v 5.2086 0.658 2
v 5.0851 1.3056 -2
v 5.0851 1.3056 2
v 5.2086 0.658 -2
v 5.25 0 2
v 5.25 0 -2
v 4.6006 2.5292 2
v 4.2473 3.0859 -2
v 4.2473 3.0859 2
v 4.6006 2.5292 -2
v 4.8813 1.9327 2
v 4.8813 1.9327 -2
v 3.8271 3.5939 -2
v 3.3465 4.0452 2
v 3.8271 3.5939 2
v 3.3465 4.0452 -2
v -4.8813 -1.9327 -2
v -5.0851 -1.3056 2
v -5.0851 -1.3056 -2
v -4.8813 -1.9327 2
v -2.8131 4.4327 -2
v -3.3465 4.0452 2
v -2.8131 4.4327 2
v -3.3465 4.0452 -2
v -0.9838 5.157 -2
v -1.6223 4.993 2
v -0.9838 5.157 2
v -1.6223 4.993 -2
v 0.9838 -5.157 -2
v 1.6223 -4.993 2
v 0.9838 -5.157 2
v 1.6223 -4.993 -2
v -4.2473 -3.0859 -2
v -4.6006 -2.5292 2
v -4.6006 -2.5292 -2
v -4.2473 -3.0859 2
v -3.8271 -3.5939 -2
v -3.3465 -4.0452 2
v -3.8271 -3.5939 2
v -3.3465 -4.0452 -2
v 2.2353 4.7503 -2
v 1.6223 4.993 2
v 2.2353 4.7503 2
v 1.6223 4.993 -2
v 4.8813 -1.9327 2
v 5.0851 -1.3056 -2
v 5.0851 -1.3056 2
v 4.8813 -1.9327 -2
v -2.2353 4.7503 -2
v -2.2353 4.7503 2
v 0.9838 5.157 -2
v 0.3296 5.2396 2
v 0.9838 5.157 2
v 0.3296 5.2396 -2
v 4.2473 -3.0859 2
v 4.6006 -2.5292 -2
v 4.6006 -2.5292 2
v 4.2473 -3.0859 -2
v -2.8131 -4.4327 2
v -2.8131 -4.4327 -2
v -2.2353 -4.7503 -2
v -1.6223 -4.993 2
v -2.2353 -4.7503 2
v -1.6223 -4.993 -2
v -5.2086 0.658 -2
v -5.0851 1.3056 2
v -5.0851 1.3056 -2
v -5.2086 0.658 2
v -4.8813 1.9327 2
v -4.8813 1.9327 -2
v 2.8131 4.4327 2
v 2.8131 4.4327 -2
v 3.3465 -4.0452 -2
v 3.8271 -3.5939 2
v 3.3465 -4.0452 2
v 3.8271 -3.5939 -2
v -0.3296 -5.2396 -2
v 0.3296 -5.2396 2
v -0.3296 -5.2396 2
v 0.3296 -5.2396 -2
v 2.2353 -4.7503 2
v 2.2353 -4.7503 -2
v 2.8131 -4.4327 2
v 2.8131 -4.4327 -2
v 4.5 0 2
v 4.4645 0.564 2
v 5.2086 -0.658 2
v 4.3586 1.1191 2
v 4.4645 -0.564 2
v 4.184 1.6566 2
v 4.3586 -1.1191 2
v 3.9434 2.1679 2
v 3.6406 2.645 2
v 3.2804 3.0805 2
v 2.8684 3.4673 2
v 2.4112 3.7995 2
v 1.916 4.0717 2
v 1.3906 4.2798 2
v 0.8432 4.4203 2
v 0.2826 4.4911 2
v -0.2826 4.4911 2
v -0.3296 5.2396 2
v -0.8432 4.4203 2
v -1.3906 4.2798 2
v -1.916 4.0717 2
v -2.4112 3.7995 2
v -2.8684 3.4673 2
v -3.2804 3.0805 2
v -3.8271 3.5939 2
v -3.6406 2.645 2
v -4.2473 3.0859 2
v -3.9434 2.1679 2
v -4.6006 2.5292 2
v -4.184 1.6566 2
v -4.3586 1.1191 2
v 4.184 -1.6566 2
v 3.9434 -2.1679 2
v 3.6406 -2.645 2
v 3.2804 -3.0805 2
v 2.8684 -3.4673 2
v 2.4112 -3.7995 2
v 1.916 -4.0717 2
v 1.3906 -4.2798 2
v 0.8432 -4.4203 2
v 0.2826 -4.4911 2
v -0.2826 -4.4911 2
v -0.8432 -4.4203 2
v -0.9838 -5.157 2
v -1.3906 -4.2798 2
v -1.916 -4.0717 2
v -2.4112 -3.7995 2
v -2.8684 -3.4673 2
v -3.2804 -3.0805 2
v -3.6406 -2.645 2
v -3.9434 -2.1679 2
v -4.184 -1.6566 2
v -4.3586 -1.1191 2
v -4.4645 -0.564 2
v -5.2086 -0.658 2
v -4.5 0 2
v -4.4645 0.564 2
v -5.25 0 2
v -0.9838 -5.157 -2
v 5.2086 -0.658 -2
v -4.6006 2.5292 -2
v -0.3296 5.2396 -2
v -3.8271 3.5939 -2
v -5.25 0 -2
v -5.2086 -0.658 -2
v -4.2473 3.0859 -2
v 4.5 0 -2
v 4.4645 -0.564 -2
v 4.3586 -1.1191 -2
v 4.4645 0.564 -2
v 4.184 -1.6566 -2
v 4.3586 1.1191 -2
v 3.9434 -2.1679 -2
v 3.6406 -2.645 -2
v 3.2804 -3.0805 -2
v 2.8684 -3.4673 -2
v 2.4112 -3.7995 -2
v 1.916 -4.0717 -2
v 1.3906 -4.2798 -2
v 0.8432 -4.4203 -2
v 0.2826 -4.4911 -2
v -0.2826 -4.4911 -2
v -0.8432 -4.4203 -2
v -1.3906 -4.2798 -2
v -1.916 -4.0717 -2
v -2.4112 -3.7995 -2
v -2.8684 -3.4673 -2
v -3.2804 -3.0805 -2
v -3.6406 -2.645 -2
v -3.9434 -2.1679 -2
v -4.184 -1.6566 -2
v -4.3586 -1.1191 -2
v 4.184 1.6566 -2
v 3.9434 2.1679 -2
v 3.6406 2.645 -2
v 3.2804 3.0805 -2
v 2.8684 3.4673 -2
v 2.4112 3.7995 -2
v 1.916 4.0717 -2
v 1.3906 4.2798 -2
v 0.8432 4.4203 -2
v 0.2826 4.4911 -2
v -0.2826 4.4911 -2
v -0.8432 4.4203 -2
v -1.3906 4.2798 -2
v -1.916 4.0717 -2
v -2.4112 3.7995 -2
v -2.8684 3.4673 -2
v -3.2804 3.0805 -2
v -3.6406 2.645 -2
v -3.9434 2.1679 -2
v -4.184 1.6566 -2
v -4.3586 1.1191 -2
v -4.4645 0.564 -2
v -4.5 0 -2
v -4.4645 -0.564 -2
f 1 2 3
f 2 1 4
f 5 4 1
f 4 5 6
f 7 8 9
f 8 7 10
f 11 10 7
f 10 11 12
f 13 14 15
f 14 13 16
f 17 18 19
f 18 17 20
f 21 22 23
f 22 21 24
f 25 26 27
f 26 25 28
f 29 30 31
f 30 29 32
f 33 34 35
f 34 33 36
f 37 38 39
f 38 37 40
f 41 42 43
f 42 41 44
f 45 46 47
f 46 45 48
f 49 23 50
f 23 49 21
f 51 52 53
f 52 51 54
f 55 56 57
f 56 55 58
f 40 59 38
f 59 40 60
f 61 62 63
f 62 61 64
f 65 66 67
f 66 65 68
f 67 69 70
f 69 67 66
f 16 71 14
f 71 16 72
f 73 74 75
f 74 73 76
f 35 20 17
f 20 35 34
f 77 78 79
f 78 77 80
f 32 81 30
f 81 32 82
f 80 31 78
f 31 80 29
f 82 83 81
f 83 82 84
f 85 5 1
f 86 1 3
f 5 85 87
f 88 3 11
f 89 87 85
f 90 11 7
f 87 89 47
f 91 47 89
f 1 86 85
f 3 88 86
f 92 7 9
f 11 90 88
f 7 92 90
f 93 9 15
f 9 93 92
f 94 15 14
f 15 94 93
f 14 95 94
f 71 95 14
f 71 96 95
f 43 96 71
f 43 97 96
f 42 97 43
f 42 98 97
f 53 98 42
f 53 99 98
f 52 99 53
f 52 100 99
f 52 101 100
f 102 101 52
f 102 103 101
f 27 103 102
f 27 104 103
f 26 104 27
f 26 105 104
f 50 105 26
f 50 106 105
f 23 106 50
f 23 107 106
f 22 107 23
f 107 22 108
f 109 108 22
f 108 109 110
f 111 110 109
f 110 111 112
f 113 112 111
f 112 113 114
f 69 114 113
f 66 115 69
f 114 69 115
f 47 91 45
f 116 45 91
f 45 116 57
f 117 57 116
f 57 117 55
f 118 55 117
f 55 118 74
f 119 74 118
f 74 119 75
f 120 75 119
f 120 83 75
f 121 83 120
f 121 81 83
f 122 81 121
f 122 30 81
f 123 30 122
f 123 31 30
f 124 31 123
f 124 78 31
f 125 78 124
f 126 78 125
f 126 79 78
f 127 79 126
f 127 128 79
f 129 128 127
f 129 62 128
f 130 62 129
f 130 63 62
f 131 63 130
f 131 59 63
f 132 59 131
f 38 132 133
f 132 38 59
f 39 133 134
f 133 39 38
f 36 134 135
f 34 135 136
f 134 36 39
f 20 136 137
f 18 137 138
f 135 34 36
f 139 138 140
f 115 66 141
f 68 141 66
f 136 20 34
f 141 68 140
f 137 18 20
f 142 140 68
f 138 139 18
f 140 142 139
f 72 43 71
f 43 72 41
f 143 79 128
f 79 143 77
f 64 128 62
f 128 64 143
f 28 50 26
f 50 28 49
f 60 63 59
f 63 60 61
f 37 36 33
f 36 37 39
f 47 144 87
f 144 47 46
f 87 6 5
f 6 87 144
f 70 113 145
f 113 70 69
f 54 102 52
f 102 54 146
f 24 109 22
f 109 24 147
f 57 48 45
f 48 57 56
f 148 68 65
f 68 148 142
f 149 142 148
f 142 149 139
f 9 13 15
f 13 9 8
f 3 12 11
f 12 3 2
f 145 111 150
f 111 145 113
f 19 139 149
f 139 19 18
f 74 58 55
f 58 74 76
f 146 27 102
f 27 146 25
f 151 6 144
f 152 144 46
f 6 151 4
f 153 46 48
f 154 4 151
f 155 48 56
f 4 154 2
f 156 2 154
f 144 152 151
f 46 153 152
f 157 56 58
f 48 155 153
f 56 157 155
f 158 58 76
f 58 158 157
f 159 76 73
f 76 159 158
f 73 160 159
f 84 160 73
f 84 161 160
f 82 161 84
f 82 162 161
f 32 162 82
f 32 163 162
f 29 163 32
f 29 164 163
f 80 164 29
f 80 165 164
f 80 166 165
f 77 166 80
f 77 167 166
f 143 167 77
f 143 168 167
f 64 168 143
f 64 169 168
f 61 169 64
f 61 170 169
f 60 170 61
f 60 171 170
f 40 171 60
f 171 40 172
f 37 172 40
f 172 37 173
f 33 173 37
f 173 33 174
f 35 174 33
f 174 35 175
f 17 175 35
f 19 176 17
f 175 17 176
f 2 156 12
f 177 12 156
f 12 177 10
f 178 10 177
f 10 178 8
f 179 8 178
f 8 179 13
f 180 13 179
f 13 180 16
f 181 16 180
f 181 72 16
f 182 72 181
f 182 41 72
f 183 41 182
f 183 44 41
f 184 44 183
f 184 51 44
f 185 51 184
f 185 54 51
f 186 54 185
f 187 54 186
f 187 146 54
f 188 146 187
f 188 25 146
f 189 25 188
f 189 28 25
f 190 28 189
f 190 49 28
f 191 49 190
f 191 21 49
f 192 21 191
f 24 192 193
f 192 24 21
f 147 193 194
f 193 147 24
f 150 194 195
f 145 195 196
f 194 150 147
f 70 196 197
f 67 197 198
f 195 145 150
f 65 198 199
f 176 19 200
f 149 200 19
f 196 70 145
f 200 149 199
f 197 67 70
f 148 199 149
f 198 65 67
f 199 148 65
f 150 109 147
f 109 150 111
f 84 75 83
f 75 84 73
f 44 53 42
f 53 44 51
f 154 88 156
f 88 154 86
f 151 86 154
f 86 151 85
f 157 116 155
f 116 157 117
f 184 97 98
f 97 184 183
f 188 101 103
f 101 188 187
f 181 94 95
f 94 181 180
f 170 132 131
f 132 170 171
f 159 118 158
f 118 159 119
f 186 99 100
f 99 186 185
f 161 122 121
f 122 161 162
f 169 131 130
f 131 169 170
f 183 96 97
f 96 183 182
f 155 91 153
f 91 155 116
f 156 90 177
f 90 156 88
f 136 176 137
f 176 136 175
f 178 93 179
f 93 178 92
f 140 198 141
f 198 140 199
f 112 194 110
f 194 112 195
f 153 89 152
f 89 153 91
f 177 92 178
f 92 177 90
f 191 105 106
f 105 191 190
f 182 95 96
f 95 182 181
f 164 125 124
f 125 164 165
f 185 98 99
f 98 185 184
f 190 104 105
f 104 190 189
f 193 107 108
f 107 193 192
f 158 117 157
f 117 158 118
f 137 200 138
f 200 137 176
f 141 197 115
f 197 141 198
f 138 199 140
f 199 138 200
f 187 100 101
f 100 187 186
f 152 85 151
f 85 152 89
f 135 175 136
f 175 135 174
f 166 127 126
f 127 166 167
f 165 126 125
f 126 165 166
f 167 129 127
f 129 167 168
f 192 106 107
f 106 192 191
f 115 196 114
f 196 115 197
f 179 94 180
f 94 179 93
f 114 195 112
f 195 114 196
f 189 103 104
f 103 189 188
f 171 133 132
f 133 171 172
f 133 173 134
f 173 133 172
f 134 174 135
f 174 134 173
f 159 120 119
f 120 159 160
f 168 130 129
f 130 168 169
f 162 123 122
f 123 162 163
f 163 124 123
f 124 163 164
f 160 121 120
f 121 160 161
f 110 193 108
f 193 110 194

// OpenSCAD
$fn = 50;


difference() {
	union() {
		translate(v = [0, 0, -2.0000000000]) {
			cylinder(h = 4, r = 5.2500000000);
		}
	}
	union() {
		translate(v = [0, 0, -100.0000000000]) {
			cylinder(h = 200, r = 4.5000000000);
		}
	}
}
